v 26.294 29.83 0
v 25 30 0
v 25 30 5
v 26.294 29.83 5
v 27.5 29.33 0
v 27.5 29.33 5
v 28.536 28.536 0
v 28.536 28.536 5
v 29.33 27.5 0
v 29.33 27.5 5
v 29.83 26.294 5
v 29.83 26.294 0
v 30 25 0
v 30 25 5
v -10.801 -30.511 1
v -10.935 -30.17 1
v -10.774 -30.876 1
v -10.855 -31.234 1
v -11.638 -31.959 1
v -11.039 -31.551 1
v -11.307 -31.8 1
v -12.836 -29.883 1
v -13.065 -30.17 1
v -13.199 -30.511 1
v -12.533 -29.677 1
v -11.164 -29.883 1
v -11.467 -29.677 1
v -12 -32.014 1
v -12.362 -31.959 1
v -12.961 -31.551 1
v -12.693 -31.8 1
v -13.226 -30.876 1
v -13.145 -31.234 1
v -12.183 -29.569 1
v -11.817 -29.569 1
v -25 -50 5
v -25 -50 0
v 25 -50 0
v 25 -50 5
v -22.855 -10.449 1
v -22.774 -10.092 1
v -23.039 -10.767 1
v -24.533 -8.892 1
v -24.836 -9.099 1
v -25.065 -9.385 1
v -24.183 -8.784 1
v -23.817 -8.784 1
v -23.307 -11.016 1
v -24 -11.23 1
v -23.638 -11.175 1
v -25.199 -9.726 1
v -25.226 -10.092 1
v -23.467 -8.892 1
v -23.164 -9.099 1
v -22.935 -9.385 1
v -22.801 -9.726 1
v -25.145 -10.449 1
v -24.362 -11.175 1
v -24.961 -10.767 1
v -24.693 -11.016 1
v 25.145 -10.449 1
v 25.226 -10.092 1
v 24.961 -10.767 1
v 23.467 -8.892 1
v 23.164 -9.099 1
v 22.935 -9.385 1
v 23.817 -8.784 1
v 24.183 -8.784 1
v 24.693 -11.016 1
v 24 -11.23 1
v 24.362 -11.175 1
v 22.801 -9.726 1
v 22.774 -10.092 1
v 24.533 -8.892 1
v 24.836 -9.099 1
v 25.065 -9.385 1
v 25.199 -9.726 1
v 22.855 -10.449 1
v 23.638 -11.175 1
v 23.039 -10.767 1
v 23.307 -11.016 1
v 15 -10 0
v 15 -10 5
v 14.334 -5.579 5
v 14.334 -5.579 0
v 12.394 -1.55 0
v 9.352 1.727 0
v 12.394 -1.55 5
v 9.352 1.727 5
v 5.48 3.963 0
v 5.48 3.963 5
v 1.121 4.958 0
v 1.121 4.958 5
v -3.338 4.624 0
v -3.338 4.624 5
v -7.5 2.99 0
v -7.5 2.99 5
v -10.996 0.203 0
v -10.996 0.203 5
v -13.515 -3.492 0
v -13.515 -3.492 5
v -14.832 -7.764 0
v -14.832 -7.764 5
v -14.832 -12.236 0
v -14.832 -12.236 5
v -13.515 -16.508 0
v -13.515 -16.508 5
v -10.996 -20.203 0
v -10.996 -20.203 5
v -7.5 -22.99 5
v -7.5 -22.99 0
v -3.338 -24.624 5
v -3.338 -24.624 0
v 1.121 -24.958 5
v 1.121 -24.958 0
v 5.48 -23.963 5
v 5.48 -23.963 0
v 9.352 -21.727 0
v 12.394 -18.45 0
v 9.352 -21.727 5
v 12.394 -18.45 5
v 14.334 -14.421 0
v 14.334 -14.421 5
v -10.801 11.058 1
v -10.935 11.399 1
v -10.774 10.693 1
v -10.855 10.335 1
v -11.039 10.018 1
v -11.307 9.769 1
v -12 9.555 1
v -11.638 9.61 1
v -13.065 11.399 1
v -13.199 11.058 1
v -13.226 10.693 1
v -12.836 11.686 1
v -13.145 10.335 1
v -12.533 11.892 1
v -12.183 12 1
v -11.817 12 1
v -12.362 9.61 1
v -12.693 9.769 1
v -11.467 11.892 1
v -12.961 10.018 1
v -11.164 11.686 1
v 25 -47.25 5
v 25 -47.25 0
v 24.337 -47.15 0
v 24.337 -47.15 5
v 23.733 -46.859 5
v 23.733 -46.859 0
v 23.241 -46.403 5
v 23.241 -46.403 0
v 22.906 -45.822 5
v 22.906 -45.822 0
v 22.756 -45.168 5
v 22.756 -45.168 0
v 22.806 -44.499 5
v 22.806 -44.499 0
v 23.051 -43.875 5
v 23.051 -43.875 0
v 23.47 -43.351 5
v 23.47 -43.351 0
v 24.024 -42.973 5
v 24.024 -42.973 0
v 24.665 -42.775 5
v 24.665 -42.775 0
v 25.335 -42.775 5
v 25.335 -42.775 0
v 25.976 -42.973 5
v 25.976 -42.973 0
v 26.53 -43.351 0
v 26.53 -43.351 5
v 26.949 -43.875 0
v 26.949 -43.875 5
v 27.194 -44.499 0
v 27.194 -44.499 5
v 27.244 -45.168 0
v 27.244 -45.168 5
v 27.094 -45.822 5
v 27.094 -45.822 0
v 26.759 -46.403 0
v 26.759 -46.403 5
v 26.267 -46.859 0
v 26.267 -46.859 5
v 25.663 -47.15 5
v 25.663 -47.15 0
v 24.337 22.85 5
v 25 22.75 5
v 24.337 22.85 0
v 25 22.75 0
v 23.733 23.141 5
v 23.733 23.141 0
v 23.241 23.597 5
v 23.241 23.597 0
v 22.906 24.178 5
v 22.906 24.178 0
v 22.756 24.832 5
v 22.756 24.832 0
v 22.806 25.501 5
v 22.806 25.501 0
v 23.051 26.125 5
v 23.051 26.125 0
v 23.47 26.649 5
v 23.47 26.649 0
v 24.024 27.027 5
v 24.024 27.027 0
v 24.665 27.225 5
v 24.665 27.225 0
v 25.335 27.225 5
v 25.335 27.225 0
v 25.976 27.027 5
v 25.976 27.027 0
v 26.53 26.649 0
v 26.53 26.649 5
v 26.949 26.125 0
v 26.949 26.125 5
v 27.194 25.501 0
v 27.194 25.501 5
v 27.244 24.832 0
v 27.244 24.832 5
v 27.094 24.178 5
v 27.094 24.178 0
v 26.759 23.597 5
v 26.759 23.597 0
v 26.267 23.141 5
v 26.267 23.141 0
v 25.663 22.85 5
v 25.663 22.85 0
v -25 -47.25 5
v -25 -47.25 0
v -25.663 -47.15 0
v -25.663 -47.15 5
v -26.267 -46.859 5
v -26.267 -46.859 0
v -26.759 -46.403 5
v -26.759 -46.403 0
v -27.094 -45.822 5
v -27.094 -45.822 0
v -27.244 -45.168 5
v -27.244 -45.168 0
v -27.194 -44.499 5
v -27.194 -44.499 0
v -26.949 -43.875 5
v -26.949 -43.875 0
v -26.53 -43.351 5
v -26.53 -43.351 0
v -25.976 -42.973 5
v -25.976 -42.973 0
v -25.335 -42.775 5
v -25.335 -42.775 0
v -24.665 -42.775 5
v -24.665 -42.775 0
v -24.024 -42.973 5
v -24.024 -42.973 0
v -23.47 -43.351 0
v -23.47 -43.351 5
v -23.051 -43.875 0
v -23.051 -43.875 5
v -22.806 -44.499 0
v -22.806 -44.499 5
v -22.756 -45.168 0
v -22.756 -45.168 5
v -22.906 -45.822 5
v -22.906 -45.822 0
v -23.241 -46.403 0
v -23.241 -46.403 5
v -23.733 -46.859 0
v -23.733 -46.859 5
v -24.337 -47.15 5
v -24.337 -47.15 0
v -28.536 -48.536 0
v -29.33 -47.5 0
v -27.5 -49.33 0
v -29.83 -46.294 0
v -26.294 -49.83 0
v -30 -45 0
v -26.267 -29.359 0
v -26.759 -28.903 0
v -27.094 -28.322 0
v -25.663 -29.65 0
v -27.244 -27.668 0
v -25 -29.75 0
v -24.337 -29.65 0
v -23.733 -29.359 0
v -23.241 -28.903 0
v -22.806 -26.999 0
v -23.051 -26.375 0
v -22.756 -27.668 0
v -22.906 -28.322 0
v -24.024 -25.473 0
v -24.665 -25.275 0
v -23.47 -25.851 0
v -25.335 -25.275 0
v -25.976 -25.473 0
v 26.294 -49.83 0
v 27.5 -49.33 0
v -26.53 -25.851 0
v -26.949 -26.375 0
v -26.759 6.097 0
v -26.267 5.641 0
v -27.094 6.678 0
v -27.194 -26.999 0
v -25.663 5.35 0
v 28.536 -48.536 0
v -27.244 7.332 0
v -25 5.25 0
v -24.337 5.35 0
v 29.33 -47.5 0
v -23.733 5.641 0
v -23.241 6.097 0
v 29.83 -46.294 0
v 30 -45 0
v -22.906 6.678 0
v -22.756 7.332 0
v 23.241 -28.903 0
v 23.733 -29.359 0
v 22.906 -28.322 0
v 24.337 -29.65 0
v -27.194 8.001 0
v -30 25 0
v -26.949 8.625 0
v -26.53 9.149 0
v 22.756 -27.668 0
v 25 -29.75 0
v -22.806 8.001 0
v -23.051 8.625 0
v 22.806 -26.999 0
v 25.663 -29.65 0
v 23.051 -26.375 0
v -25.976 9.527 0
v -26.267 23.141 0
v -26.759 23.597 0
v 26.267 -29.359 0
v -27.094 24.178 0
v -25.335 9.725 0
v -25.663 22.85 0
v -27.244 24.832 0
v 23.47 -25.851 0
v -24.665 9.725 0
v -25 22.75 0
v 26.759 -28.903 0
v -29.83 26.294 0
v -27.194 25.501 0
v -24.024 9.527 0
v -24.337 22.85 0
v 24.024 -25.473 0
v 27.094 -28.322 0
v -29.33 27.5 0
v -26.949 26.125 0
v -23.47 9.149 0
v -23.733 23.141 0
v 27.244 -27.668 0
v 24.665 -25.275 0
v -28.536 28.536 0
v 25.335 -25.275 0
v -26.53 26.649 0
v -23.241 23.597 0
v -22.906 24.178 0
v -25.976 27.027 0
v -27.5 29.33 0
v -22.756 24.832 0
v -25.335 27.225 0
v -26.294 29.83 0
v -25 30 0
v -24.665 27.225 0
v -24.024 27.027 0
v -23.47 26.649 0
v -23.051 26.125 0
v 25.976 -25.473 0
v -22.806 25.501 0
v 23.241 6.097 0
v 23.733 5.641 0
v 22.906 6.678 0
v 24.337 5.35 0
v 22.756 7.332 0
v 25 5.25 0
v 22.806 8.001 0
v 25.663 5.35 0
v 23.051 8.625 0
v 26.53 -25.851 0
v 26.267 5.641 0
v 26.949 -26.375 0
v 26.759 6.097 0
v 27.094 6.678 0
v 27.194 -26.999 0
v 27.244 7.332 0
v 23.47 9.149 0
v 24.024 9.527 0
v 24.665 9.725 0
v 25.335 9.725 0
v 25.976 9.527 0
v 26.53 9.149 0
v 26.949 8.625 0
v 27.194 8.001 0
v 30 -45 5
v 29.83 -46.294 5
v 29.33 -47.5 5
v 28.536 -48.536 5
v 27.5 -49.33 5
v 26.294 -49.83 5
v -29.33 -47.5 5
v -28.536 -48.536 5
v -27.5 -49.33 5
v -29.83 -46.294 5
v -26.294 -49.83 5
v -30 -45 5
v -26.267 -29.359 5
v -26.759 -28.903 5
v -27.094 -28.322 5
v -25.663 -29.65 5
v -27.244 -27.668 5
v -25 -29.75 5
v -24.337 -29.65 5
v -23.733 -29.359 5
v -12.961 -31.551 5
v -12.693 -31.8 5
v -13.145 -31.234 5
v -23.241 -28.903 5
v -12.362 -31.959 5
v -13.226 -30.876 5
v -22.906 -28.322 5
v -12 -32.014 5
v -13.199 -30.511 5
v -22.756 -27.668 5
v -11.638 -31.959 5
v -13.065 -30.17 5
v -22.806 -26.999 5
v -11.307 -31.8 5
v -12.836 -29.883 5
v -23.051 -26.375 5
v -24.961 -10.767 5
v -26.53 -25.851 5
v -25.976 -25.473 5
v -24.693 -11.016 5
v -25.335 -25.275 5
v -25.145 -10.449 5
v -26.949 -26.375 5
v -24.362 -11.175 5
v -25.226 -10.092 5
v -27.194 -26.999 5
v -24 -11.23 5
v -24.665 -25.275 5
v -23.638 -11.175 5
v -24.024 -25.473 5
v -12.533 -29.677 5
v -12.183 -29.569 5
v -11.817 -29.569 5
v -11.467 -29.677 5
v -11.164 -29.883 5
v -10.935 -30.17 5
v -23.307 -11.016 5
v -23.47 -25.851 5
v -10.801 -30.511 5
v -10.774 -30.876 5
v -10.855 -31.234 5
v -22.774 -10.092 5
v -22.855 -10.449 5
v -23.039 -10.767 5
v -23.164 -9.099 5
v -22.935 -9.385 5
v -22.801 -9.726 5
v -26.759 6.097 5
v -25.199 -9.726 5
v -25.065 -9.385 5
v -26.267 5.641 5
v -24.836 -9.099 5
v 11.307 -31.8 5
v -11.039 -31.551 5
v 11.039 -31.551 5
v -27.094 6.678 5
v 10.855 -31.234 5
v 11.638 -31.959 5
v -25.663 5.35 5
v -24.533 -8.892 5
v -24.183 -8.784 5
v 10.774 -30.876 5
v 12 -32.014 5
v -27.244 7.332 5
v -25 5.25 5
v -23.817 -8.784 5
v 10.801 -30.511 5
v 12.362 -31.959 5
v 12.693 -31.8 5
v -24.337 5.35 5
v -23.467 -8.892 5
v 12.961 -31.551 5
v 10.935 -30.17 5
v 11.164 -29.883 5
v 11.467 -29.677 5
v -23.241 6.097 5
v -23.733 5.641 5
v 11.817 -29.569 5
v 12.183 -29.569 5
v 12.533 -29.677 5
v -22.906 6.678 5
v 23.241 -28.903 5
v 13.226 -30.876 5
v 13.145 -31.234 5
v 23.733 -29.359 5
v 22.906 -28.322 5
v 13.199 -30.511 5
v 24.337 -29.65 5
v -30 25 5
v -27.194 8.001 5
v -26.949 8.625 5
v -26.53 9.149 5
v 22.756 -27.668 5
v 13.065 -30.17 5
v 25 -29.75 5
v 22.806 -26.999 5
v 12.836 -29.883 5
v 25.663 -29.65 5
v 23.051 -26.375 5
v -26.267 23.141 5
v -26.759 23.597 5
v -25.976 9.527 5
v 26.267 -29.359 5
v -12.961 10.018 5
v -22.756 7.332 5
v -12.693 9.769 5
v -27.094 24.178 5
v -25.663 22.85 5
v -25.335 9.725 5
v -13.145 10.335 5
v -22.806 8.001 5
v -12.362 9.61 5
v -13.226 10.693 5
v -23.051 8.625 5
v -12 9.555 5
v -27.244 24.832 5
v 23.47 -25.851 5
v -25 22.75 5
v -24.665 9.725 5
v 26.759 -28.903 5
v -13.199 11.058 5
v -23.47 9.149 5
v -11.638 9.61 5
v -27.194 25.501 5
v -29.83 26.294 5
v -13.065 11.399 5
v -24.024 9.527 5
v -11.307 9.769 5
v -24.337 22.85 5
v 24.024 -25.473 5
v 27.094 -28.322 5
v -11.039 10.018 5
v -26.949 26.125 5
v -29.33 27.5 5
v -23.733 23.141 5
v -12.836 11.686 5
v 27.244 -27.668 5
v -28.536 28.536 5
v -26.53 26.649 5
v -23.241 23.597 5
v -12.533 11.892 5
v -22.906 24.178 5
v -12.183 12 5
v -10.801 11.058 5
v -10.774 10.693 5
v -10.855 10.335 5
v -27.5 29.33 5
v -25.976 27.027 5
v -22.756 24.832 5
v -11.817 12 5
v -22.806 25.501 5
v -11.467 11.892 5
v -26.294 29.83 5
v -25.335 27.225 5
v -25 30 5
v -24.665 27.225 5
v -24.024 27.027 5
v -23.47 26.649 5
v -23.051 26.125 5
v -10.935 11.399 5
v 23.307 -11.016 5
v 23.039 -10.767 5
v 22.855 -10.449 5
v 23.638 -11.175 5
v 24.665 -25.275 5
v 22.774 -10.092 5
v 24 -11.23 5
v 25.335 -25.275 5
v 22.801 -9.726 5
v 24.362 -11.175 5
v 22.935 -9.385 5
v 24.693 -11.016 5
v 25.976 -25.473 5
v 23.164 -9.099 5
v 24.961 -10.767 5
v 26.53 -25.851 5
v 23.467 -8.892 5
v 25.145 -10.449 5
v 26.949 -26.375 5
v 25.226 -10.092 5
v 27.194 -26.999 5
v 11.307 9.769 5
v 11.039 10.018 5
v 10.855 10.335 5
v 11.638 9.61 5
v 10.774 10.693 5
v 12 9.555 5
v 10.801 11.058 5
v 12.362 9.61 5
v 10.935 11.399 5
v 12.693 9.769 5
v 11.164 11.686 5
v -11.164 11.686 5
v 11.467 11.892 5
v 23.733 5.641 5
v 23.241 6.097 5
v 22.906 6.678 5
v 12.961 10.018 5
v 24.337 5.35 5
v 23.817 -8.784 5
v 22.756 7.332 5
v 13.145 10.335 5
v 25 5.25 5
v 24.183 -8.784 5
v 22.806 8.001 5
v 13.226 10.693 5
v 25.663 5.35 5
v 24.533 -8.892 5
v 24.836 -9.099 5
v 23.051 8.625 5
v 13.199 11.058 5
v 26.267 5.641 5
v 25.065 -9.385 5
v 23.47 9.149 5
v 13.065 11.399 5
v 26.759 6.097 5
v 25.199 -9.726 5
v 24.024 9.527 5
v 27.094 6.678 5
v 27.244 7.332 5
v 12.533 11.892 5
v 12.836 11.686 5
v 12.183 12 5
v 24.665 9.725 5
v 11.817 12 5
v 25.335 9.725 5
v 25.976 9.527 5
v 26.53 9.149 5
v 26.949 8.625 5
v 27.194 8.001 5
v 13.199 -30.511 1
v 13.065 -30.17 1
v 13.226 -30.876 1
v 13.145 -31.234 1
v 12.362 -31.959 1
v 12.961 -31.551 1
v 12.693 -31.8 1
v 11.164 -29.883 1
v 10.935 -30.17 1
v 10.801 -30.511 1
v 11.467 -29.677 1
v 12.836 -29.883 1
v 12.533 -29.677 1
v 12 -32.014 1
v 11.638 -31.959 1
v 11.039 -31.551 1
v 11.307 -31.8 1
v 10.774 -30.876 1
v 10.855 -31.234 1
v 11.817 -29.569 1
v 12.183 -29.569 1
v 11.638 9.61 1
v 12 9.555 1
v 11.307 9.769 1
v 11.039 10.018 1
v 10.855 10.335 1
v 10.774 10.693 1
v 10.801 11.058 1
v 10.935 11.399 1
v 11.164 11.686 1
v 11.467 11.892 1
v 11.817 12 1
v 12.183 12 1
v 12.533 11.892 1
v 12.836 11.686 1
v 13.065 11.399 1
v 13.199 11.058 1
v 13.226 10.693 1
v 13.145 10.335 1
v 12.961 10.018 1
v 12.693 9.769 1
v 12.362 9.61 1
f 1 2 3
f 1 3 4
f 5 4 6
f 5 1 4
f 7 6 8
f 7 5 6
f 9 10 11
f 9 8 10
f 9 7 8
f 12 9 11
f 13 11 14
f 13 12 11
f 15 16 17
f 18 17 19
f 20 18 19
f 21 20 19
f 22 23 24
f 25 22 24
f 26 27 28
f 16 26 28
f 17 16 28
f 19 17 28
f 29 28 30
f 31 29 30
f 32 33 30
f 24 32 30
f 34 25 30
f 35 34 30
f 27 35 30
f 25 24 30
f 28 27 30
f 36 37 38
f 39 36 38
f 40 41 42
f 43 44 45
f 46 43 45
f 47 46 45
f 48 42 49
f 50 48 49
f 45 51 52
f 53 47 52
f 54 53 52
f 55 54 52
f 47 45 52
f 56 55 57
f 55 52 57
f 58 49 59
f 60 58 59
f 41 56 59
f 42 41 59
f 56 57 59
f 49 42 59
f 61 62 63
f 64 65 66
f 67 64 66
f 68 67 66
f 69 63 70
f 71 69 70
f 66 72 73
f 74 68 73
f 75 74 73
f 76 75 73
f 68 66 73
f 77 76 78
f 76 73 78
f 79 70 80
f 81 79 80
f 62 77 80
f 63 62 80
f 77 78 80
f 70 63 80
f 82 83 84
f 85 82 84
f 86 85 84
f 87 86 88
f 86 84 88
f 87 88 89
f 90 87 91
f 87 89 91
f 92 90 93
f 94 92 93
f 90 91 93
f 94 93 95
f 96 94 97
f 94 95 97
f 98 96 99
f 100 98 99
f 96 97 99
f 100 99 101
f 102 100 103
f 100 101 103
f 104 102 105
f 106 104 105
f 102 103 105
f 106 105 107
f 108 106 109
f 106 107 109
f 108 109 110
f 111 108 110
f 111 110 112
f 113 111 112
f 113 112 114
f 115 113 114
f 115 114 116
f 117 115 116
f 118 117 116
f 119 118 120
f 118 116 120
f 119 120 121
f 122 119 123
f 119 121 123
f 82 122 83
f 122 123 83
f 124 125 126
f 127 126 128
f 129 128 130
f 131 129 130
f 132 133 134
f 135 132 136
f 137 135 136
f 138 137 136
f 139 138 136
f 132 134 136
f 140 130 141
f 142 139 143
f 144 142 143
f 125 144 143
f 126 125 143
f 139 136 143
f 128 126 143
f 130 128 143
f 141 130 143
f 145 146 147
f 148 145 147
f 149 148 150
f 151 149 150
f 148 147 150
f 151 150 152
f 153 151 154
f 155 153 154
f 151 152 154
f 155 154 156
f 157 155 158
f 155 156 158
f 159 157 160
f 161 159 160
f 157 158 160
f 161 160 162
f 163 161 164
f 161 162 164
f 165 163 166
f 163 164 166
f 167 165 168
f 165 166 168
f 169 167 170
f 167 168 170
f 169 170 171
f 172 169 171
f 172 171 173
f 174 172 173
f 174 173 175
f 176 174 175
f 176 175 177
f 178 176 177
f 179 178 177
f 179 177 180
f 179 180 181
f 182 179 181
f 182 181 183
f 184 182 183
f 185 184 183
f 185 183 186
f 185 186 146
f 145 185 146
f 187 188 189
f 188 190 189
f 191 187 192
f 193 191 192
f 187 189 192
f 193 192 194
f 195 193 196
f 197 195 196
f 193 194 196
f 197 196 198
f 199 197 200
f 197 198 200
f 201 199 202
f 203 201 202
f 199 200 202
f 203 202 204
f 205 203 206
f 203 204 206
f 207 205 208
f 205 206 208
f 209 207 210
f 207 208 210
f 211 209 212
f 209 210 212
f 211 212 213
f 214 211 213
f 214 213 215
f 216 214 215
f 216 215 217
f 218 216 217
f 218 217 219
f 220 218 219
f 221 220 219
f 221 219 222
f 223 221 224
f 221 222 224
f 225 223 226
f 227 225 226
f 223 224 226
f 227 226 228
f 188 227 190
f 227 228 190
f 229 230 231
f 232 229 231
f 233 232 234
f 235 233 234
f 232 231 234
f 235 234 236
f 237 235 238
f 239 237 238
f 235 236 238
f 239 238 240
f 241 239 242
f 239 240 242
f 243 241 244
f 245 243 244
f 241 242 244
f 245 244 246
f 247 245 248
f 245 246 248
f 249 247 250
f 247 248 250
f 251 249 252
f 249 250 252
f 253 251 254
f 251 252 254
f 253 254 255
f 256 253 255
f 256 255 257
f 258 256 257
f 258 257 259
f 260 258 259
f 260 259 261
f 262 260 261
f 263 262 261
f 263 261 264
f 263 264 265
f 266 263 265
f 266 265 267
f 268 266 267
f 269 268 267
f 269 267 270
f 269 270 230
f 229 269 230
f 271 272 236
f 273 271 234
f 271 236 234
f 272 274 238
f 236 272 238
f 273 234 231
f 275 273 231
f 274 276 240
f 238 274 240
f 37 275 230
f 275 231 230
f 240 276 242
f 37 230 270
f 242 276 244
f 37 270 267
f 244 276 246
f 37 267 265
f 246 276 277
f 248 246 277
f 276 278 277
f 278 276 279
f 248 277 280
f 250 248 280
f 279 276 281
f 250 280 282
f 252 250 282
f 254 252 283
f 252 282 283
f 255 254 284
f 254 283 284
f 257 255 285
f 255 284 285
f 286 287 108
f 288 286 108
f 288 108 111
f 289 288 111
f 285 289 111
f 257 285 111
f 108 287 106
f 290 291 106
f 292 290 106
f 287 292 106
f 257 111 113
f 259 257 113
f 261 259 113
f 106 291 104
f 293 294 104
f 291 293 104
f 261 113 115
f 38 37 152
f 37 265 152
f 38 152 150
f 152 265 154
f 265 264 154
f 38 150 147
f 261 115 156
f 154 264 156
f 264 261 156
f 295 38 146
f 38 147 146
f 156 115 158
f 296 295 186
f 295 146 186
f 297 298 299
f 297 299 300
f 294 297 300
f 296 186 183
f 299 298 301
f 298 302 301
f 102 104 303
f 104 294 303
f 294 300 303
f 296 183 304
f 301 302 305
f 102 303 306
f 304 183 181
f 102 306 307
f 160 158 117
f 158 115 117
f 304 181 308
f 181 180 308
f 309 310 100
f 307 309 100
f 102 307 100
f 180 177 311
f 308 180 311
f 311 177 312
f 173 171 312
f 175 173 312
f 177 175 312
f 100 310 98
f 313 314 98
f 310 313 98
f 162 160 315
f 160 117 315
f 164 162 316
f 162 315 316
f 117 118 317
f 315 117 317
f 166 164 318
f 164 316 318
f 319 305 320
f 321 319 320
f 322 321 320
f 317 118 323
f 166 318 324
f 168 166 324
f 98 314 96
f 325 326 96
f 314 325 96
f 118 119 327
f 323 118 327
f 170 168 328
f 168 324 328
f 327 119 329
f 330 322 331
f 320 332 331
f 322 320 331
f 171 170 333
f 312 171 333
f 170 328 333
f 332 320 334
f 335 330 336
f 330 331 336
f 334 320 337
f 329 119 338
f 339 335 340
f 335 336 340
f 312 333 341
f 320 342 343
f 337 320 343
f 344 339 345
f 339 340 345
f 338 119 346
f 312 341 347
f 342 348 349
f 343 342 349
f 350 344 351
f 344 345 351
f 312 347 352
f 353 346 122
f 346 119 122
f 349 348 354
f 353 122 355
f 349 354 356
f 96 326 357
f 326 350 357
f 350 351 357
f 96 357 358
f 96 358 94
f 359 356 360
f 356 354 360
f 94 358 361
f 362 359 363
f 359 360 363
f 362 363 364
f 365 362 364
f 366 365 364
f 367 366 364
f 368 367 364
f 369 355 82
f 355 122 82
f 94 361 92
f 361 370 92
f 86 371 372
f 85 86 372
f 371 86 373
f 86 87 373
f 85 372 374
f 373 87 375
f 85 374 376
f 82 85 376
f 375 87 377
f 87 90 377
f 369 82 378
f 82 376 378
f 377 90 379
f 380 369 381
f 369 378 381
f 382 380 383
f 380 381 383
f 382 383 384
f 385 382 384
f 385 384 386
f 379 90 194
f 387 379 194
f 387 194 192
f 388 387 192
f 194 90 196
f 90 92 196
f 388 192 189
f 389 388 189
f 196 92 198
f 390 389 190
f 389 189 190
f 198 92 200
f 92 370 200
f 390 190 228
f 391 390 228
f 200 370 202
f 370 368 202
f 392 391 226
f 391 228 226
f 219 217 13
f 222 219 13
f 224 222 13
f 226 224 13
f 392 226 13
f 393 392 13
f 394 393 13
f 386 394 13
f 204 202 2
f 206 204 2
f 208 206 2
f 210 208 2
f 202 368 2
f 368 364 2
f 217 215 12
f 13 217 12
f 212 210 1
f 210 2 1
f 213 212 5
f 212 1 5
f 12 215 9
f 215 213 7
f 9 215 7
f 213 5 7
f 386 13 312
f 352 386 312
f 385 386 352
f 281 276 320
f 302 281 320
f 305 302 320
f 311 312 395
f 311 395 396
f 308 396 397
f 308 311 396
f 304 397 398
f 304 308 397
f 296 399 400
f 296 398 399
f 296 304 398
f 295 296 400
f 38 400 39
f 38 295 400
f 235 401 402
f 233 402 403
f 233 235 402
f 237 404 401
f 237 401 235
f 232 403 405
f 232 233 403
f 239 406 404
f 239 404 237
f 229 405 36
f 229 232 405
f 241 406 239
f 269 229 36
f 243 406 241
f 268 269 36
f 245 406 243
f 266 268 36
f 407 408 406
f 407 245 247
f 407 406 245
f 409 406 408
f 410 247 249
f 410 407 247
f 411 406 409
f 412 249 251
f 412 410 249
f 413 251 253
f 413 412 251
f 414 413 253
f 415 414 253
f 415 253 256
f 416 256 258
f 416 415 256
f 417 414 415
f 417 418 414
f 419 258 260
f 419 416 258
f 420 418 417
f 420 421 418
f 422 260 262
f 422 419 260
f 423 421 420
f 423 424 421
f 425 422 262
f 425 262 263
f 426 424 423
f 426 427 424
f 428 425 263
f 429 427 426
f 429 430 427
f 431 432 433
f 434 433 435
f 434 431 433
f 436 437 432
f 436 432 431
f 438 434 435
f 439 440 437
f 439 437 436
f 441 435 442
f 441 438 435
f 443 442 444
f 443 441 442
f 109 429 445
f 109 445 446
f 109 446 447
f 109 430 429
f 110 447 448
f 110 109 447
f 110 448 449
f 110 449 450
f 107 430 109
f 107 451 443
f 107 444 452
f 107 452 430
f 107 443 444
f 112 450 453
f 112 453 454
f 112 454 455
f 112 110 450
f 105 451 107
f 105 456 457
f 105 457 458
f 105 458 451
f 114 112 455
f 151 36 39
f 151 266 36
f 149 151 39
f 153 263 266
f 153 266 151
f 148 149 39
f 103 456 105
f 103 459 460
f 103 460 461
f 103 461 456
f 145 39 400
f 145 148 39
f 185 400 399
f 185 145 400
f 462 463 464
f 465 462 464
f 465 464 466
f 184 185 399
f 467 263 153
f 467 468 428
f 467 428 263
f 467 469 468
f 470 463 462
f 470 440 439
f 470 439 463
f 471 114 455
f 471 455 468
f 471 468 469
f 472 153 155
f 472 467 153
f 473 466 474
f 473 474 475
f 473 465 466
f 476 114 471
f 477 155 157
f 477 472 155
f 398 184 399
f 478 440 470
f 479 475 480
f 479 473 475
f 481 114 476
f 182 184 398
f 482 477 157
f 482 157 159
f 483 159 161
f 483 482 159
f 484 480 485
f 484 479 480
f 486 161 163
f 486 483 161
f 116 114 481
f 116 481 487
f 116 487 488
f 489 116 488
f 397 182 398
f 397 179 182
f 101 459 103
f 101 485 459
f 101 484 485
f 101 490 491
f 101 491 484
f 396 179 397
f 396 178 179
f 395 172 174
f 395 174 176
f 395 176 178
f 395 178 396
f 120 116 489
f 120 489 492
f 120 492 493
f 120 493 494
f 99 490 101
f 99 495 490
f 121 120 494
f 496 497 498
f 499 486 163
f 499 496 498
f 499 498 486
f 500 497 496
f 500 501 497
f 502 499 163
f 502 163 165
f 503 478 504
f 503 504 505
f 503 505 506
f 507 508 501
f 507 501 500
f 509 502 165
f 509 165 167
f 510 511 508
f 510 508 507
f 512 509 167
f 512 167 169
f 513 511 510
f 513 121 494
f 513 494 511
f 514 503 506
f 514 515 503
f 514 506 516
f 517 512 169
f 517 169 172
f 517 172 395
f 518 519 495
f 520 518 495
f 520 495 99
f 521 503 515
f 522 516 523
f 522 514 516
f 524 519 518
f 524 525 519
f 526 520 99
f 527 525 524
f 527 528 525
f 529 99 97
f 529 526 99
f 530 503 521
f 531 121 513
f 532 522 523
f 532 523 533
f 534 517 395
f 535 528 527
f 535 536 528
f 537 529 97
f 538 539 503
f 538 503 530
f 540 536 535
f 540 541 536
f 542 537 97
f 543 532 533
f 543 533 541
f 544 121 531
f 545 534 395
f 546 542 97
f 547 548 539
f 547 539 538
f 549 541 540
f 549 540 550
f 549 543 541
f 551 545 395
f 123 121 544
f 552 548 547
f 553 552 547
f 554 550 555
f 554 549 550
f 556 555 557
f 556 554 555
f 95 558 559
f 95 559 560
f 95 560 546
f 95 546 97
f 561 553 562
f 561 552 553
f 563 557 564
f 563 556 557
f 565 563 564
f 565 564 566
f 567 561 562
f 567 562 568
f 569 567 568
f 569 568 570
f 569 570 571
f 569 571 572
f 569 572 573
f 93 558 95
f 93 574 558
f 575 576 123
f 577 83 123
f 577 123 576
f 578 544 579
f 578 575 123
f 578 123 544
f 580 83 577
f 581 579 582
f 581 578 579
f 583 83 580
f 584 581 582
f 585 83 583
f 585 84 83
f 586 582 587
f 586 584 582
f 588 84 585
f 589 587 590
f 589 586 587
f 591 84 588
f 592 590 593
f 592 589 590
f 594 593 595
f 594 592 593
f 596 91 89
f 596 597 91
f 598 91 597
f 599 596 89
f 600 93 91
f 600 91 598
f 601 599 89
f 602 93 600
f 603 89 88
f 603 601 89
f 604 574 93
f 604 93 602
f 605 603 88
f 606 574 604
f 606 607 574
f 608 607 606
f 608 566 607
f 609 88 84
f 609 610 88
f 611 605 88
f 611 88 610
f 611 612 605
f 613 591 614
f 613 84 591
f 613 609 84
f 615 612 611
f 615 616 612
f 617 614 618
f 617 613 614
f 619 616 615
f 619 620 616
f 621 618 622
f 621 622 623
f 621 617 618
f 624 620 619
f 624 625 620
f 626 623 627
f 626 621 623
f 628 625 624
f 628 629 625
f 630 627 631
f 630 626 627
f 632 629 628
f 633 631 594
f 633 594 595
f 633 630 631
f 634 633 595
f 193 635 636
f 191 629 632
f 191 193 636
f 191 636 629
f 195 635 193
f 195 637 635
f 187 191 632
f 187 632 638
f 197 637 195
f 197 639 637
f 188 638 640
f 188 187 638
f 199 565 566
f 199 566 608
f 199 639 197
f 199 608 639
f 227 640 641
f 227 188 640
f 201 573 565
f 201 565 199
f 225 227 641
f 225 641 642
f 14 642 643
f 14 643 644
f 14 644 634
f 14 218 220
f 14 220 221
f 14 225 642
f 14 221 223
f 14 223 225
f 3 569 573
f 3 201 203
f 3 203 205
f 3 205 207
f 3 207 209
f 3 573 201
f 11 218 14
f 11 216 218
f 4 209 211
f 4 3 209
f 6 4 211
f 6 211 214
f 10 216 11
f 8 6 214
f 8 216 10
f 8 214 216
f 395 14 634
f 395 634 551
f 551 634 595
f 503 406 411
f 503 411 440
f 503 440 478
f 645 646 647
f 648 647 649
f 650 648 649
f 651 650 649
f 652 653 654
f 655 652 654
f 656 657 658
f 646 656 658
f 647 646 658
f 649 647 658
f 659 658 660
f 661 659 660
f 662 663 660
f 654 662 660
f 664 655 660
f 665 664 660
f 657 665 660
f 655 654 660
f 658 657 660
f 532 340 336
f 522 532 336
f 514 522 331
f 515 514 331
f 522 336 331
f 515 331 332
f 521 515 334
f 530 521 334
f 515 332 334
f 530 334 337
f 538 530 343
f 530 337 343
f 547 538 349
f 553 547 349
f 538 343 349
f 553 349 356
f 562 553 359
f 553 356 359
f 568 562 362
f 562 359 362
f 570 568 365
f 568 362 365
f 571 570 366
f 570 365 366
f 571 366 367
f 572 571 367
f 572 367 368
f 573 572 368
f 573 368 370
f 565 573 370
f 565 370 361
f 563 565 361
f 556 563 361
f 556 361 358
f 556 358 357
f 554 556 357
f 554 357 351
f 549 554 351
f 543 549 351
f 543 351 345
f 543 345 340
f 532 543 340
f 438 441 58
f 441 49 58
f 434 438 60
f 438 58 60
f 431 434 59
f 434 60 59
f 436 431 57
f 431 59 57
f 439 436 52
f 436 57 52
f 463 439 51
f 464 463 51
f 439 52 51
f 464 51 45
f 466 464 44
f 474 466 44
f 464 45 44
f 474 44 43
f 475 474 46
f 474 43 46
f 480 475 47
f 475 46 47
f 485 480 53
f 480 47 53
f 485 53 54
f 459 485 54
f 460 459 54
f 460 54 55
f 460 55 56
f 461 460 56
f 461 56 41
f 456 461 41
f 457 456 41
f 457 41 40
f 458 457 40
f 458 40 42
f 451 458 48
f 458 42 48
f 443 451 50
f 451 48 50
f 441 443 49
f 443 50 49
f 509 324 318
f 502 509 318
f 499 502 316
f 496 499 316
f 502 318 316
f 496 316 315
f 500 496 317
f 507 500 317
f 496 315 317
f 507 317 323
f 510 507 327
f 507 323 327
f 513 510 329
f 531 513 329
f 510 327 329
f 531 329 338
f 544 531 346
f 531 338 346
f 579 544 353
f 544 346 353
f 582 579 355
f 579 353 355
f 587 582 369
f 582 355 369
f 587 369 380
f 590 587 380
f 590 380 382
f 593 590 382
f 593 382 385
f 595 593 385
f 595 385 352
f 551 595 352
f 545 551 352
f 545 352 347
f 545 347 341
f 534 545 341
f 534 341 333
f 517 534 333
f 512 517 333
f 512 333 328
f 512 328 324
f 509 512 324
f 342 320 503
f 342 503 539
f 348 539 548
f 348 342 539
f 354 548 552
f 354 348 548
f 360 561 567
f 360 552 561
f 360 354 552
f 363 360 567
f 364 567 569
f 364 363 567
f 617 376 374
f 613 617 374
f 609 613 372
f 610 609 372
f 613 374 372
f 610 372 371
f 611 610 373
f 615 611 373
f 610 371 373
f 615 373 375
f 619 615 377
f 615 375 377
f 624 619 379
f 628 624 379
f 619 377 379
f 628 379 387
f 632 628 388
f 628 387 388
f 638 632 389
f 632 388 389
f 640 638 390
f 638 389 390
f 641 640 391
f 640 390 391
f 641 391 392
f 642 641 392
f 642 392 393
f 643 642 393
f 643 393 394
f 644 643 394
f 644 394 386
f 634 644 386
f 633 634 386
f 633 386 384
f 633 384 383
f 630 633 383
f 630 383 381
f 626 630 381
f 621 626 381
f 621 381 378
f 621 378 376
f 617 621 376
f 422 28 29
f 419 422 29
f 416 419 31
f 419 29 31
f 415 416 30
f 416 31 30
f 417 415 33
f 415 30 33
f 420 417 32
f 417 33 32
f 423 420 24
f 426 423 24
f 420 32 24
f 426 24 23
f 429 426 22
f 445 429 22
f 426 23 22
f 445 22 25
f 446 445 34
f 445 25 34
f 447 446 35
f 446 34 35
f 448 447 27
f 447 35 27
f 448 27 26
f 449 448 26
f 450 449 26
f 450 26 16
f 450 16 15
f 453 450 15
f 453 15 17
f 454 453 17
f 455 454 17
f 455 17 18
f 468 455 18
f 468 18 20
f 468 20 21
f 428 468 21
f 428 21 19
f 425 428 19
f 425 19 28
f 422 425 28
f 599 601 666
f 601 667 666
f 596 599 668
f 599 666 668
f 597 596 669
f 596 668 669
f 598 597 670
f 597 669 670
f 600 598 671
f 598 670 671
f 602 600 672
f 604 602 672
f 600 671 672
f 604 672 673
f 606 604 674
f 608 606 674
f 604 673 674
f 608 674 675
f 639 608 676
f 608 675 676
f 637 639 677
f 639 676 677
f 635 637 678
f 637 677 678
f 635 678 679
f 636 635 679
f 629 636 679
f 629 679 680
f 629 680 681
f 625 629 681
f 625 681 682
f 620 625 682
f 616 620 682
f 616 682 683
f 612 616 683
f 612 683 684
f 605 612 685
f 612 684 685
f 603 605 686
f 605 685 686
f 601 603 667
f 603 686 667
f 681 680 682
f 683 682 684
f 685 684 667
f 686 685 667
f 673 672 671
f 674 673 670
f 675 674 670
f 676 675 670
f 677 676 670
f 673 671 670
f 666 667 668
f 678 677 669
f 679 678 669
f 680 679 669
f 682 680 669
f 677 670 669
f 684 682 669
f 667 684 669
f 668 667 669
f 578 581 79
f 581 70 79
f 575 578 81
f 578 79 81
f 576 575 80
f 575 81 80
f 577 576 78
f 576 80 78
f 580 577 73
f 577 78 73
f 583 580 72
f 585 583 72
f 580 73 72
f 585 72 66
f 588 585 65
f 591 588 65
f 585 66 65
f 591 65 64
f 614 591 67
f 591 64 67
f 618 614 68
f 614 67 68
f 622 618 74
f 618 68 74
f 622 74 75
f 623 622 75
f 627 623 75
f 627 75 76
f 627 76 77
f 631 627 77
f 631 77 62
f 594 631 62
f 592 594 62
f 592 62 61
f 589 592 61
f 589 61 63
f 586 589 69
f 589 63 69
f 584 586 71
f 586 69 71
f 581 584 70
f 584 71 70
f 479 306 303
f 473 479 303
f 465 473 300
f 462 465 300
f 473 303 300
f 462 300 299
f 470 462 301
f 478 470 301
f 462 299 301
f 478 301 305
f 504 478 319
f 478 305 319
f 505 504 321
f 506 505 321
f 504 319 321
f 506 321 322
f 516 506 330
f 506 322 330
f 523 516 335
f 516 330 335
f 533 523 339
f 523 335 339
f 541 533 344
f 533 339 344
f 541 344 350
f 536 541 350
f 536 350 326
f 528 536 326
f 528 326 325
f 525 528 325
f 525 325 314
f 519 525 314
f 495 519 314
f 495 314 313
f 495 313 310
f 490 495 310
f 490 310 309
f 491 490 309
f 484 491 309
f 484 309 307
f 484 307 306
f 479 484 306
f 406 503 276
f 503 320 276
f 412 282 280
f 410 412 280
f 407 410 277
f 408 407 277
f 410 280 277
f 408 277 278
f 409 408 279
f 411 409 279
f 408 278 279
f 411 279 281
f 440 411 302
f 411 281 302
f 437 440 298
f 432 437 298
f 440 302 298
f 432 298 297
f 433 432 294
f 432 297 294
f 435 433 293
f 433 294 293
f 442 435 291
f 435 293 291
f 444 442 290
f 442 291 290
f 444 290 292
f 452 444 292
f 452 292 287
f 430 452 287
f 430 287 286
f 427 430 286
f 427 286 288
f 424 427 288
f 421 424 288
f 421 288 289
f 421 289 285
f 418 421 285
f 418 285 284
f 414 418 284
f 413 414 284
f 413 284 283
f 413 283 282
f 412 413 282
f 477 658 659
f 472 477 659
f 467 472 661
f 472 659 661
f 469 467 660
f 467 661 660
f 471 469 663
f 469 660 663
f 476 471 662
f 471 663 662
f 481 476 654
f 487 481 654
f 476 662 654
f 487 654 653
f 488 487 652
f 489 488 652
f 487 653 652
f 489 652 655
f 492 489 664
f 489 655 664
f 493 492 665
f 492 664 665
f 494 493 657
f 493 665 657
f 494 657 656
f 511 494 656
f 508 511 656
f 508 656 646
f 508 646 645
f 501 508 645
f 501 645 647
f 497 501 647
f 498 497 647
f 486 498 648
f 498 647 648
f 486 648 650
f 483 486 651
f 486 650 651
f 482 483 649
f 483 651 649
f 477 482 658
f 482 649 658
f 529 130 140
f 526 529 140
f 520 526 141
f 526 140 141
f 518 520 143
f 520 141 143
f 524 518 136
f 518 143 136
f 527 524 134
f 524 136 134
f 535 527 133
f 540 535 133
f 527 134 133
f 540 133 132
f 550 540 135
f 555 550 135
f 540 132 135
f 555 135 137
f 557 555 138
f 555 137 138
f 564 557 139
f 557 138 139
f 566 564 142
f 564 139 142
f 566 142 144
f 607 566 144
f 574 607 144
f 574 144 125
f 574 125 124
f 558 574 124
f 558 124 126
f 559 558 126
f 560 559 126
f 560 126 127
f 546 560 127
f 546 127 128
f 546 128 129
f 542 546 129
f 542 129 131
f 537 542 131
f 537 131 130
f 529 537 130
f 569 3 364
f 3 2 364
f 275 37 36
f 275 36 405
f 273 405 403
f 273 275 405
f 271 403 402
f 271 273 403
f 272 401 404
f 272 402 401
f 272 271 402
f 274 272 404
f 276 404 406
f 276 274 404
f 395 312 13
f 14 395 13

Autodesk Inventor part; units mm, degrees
ref_plane "YZ Plane" through (0, 0, 0) normal (1, 0, 0) x (0, 1, 0)
ref_plane "XZ Plane" through (0, 0, 0) normal (0, 1, 0) x (-1, 0, 0)
ref_plane "XY Plane" through (0, 0, 0) normal (0, 0, 1) x (1, 0, 0)
sketch "Sketch2" plane through (0, 0, 0) normal (0, 0, 1) x (1, 0, 0)
  line L0 (-25, -50) -> (25, -50) projected
  arc A0 (25, -50) -> (30, -45) centre (25, -45) ccw projected
  line L1 (30, -45) -> (30, 25) projected
  arc A1 (30, 25) -> (25, 30) centre (25, 25) ccw projected
  line L2 (25, 30) -> (-25, 30) projected
  arc A2 (-25, 30) -> (-30, 25) centre (-25, 25) ccw projected
  line L3 (-30, 25) -> (-30, -45) projected
  arc A3 (-30, -45) -> (-25, -50) centre (-25, -45) ccw projected
  circle A4 centre (25, -27.5) radius 1.621 projected
  circle A5 centre (-25, 7.5) radius 1.621 projected
  circle A6 centre (-25, -27.5) radius 1.621 projected
  circle A7 centre (25, 7.5) radius 1.621 projected
  line L4 (20, 16) -> (20, -36) projected
  arc A8 (16, -40) -> (20, -36) centre (16, -36) ccw projected
  line L5 (16, -40) -> (-16, -40) projected
  arc A9 (-20, -36) -> (-16, -40) centre (-16, -36) ccw projected
  line L6 (-20, -36) -> (-20, 16) projected
  arc A10 (-16, 20) -> (-20, 16) centre (-16, 16) ccw projected
  line L7 (-16, 20) -> (16, 20) projected
  arc A11 (20, 16) -> (16, 20) centre (16, 16) ccw projected
  circle A12 centre (25, 25) radius 1.621 projected
  circle A13 centre (-25, -45) radius 1.621 projected
  circle A14 centre (25, -45) radius 1.621 projected
  circle A15 centre (-25, 25) radius 1.621 projected
  point P0 (0, 0)
extrude "Extrusion1" add sketch "Sketch2" along normal blind 5 contours A3 L3 A2 L2 A1 L1 A0 L0 | L4 A8 L5 A9 L6 A10 L7 A11
sketch "Sketch3" plane through (0, 0, 5) normal (0, 0, 1) x (1, 0, 0)
  circle A0 centre (0, -10) radius 15
  line L0 (25, 30) -> (-25, 30) construction
  arc A1 (-25, 30) -> (-30, 25) centre (-25, 25) ccw construction
  line L1 (-30, 25) -> (-30, -45) construction
  arc A2 (-30, -45) -> (-25, -50) centre (-25, -45) ccw construction
  line L2 (-25, -50) -> (25, -50) construction
  arc A3 (25, -50) -> (30, -45) centre (25, -45) ccw construction
  line L3 (30, -45) -> (30, 25) construction
  arc A4 (30, 25) -> (25, 30) centre (25, 25) ccw construction
  line L4 (-25, -45) -> (25, 25) construction
  line L5 (25, -45) -> (-25, 25) construction
  dimension "d6" = 30
extrude "Extrusion2" cut sketch "Sketch3" against normal blind 5
sketch "Sketch6" plane through (0, 0, 5) normal (0, 0, 1) x (1, 0, 0)
  line L0 (30, -45) -> (30, 25) construction
  line L1 (25, 30) -> (-25, 30) construction
  line L2 (-30, 25) -> (-30, -45) construction
  line L3 (-25, -50) -> (25, -50) construction
  line L4 (16, -40) -> (-16, -40) construction
  line L5 (-20, -36) -> (-20, 16) construction
  line L6 (-16, 20) -> (16, 20) construction
  line L7 (20, 16) -> (20, -36) construction
  circle A0 centre (25, -27.5) radius 1.621 construction
  circle A1 centre (-25, 7.5) radius 1.621 construction
  circle A2 centre (-25, 25) radius 1.621 construction
  circle A3 centre (25, -45) radius 1.621 construction
  circle A4 centre (-25, -45) radius 1.621 construction
  circle A5 centre (25, 25) radius 1.621 construction
  circle A6 centre (-25, -27.5) radius 1.621 construction
  circle A7 centre (25, 7.5) radius 1.621 construction
  arc A8 (-30, -45) -> (-25, -50) centre (-25, -45) ccw projected
  arc A9 (25, -50) -> (30, -45) centre (25, -45) ccw projected
  arc A10 (30, 25) -> (25, 30) centre (25, 25) ccw projected
  arc A11 (-25, 30) -> (-30, 25) centre (-25, 25) ccw projected
  arc A12 (-20, -36) -> (-16, -40) centre (-16, -36) ccw projected
  arc A13 (-16, 20) -> (-20, 16) centre (-16, 16) ccw projected
  arc A14 (20, 16) -> (16, 20) centre (16, 16) ccw projected
  arc A15 (16, -40) -> (20, -36) centre (16, -36) ccw projected
hole "Hole3" at (-25, -45, 5) at (-25, -27.5, 5) at (-25, 7.5, 5) at (-25, 25, 5) at (25, 25, 5) at (25, 7.5, 5) at (25, -27.5, 5) at (25, -45, 5) direction (0, 0, -1) diameter 4.5 end through all clearance for "Flat Head Machine Screw" size "M4" standard "Ansi Metric M Profile"
sketch "Sketch7" plane through (0, 0, 5) normal (0, 0, 1) x (1, 0, 0)
  circle A0 centre (0, -10) radius 26.5 construction
  circle A1 centre (0, -10) radius 21.5 construction
  circle A2 centre (0, -10) radius 24 construction
  circle A3 centre (0, -10) radius 15 construction
  line L0 (-58.8, 0) -> (58.8, 0) construction
  line L1 (42, -10) -> (-42, -10) construction
  point P0 (-24, -10)
  point P1 (-12, -30.7846)
  point P2 (12, -30.7846)
  point P3 (24, -10)
  point P4 (12, 10.7846)
  point P5 (-12, 10.7846)
  dimension "d43" = 48
  dimension "d41" = 53
  dimension "d42" = 43
  dimension "d46" = 360
hole "Hole4" at (-24, -10, 5) at (-12, -30.7846, 5) at (12, -30.7846, 5) at (24, -10, 5) at (12, 10.7846, 5) at (-12, 10.7846, 5) direction (0, 0, -1) diameter 2.459 depth 4 thread size "M3x0.5" class "6H" standard "ISO Metric profile"
equation "\"d43\" = 0.5 * d41 + 0.5 * d42"
properties part number "P017" material "Aluminium"
